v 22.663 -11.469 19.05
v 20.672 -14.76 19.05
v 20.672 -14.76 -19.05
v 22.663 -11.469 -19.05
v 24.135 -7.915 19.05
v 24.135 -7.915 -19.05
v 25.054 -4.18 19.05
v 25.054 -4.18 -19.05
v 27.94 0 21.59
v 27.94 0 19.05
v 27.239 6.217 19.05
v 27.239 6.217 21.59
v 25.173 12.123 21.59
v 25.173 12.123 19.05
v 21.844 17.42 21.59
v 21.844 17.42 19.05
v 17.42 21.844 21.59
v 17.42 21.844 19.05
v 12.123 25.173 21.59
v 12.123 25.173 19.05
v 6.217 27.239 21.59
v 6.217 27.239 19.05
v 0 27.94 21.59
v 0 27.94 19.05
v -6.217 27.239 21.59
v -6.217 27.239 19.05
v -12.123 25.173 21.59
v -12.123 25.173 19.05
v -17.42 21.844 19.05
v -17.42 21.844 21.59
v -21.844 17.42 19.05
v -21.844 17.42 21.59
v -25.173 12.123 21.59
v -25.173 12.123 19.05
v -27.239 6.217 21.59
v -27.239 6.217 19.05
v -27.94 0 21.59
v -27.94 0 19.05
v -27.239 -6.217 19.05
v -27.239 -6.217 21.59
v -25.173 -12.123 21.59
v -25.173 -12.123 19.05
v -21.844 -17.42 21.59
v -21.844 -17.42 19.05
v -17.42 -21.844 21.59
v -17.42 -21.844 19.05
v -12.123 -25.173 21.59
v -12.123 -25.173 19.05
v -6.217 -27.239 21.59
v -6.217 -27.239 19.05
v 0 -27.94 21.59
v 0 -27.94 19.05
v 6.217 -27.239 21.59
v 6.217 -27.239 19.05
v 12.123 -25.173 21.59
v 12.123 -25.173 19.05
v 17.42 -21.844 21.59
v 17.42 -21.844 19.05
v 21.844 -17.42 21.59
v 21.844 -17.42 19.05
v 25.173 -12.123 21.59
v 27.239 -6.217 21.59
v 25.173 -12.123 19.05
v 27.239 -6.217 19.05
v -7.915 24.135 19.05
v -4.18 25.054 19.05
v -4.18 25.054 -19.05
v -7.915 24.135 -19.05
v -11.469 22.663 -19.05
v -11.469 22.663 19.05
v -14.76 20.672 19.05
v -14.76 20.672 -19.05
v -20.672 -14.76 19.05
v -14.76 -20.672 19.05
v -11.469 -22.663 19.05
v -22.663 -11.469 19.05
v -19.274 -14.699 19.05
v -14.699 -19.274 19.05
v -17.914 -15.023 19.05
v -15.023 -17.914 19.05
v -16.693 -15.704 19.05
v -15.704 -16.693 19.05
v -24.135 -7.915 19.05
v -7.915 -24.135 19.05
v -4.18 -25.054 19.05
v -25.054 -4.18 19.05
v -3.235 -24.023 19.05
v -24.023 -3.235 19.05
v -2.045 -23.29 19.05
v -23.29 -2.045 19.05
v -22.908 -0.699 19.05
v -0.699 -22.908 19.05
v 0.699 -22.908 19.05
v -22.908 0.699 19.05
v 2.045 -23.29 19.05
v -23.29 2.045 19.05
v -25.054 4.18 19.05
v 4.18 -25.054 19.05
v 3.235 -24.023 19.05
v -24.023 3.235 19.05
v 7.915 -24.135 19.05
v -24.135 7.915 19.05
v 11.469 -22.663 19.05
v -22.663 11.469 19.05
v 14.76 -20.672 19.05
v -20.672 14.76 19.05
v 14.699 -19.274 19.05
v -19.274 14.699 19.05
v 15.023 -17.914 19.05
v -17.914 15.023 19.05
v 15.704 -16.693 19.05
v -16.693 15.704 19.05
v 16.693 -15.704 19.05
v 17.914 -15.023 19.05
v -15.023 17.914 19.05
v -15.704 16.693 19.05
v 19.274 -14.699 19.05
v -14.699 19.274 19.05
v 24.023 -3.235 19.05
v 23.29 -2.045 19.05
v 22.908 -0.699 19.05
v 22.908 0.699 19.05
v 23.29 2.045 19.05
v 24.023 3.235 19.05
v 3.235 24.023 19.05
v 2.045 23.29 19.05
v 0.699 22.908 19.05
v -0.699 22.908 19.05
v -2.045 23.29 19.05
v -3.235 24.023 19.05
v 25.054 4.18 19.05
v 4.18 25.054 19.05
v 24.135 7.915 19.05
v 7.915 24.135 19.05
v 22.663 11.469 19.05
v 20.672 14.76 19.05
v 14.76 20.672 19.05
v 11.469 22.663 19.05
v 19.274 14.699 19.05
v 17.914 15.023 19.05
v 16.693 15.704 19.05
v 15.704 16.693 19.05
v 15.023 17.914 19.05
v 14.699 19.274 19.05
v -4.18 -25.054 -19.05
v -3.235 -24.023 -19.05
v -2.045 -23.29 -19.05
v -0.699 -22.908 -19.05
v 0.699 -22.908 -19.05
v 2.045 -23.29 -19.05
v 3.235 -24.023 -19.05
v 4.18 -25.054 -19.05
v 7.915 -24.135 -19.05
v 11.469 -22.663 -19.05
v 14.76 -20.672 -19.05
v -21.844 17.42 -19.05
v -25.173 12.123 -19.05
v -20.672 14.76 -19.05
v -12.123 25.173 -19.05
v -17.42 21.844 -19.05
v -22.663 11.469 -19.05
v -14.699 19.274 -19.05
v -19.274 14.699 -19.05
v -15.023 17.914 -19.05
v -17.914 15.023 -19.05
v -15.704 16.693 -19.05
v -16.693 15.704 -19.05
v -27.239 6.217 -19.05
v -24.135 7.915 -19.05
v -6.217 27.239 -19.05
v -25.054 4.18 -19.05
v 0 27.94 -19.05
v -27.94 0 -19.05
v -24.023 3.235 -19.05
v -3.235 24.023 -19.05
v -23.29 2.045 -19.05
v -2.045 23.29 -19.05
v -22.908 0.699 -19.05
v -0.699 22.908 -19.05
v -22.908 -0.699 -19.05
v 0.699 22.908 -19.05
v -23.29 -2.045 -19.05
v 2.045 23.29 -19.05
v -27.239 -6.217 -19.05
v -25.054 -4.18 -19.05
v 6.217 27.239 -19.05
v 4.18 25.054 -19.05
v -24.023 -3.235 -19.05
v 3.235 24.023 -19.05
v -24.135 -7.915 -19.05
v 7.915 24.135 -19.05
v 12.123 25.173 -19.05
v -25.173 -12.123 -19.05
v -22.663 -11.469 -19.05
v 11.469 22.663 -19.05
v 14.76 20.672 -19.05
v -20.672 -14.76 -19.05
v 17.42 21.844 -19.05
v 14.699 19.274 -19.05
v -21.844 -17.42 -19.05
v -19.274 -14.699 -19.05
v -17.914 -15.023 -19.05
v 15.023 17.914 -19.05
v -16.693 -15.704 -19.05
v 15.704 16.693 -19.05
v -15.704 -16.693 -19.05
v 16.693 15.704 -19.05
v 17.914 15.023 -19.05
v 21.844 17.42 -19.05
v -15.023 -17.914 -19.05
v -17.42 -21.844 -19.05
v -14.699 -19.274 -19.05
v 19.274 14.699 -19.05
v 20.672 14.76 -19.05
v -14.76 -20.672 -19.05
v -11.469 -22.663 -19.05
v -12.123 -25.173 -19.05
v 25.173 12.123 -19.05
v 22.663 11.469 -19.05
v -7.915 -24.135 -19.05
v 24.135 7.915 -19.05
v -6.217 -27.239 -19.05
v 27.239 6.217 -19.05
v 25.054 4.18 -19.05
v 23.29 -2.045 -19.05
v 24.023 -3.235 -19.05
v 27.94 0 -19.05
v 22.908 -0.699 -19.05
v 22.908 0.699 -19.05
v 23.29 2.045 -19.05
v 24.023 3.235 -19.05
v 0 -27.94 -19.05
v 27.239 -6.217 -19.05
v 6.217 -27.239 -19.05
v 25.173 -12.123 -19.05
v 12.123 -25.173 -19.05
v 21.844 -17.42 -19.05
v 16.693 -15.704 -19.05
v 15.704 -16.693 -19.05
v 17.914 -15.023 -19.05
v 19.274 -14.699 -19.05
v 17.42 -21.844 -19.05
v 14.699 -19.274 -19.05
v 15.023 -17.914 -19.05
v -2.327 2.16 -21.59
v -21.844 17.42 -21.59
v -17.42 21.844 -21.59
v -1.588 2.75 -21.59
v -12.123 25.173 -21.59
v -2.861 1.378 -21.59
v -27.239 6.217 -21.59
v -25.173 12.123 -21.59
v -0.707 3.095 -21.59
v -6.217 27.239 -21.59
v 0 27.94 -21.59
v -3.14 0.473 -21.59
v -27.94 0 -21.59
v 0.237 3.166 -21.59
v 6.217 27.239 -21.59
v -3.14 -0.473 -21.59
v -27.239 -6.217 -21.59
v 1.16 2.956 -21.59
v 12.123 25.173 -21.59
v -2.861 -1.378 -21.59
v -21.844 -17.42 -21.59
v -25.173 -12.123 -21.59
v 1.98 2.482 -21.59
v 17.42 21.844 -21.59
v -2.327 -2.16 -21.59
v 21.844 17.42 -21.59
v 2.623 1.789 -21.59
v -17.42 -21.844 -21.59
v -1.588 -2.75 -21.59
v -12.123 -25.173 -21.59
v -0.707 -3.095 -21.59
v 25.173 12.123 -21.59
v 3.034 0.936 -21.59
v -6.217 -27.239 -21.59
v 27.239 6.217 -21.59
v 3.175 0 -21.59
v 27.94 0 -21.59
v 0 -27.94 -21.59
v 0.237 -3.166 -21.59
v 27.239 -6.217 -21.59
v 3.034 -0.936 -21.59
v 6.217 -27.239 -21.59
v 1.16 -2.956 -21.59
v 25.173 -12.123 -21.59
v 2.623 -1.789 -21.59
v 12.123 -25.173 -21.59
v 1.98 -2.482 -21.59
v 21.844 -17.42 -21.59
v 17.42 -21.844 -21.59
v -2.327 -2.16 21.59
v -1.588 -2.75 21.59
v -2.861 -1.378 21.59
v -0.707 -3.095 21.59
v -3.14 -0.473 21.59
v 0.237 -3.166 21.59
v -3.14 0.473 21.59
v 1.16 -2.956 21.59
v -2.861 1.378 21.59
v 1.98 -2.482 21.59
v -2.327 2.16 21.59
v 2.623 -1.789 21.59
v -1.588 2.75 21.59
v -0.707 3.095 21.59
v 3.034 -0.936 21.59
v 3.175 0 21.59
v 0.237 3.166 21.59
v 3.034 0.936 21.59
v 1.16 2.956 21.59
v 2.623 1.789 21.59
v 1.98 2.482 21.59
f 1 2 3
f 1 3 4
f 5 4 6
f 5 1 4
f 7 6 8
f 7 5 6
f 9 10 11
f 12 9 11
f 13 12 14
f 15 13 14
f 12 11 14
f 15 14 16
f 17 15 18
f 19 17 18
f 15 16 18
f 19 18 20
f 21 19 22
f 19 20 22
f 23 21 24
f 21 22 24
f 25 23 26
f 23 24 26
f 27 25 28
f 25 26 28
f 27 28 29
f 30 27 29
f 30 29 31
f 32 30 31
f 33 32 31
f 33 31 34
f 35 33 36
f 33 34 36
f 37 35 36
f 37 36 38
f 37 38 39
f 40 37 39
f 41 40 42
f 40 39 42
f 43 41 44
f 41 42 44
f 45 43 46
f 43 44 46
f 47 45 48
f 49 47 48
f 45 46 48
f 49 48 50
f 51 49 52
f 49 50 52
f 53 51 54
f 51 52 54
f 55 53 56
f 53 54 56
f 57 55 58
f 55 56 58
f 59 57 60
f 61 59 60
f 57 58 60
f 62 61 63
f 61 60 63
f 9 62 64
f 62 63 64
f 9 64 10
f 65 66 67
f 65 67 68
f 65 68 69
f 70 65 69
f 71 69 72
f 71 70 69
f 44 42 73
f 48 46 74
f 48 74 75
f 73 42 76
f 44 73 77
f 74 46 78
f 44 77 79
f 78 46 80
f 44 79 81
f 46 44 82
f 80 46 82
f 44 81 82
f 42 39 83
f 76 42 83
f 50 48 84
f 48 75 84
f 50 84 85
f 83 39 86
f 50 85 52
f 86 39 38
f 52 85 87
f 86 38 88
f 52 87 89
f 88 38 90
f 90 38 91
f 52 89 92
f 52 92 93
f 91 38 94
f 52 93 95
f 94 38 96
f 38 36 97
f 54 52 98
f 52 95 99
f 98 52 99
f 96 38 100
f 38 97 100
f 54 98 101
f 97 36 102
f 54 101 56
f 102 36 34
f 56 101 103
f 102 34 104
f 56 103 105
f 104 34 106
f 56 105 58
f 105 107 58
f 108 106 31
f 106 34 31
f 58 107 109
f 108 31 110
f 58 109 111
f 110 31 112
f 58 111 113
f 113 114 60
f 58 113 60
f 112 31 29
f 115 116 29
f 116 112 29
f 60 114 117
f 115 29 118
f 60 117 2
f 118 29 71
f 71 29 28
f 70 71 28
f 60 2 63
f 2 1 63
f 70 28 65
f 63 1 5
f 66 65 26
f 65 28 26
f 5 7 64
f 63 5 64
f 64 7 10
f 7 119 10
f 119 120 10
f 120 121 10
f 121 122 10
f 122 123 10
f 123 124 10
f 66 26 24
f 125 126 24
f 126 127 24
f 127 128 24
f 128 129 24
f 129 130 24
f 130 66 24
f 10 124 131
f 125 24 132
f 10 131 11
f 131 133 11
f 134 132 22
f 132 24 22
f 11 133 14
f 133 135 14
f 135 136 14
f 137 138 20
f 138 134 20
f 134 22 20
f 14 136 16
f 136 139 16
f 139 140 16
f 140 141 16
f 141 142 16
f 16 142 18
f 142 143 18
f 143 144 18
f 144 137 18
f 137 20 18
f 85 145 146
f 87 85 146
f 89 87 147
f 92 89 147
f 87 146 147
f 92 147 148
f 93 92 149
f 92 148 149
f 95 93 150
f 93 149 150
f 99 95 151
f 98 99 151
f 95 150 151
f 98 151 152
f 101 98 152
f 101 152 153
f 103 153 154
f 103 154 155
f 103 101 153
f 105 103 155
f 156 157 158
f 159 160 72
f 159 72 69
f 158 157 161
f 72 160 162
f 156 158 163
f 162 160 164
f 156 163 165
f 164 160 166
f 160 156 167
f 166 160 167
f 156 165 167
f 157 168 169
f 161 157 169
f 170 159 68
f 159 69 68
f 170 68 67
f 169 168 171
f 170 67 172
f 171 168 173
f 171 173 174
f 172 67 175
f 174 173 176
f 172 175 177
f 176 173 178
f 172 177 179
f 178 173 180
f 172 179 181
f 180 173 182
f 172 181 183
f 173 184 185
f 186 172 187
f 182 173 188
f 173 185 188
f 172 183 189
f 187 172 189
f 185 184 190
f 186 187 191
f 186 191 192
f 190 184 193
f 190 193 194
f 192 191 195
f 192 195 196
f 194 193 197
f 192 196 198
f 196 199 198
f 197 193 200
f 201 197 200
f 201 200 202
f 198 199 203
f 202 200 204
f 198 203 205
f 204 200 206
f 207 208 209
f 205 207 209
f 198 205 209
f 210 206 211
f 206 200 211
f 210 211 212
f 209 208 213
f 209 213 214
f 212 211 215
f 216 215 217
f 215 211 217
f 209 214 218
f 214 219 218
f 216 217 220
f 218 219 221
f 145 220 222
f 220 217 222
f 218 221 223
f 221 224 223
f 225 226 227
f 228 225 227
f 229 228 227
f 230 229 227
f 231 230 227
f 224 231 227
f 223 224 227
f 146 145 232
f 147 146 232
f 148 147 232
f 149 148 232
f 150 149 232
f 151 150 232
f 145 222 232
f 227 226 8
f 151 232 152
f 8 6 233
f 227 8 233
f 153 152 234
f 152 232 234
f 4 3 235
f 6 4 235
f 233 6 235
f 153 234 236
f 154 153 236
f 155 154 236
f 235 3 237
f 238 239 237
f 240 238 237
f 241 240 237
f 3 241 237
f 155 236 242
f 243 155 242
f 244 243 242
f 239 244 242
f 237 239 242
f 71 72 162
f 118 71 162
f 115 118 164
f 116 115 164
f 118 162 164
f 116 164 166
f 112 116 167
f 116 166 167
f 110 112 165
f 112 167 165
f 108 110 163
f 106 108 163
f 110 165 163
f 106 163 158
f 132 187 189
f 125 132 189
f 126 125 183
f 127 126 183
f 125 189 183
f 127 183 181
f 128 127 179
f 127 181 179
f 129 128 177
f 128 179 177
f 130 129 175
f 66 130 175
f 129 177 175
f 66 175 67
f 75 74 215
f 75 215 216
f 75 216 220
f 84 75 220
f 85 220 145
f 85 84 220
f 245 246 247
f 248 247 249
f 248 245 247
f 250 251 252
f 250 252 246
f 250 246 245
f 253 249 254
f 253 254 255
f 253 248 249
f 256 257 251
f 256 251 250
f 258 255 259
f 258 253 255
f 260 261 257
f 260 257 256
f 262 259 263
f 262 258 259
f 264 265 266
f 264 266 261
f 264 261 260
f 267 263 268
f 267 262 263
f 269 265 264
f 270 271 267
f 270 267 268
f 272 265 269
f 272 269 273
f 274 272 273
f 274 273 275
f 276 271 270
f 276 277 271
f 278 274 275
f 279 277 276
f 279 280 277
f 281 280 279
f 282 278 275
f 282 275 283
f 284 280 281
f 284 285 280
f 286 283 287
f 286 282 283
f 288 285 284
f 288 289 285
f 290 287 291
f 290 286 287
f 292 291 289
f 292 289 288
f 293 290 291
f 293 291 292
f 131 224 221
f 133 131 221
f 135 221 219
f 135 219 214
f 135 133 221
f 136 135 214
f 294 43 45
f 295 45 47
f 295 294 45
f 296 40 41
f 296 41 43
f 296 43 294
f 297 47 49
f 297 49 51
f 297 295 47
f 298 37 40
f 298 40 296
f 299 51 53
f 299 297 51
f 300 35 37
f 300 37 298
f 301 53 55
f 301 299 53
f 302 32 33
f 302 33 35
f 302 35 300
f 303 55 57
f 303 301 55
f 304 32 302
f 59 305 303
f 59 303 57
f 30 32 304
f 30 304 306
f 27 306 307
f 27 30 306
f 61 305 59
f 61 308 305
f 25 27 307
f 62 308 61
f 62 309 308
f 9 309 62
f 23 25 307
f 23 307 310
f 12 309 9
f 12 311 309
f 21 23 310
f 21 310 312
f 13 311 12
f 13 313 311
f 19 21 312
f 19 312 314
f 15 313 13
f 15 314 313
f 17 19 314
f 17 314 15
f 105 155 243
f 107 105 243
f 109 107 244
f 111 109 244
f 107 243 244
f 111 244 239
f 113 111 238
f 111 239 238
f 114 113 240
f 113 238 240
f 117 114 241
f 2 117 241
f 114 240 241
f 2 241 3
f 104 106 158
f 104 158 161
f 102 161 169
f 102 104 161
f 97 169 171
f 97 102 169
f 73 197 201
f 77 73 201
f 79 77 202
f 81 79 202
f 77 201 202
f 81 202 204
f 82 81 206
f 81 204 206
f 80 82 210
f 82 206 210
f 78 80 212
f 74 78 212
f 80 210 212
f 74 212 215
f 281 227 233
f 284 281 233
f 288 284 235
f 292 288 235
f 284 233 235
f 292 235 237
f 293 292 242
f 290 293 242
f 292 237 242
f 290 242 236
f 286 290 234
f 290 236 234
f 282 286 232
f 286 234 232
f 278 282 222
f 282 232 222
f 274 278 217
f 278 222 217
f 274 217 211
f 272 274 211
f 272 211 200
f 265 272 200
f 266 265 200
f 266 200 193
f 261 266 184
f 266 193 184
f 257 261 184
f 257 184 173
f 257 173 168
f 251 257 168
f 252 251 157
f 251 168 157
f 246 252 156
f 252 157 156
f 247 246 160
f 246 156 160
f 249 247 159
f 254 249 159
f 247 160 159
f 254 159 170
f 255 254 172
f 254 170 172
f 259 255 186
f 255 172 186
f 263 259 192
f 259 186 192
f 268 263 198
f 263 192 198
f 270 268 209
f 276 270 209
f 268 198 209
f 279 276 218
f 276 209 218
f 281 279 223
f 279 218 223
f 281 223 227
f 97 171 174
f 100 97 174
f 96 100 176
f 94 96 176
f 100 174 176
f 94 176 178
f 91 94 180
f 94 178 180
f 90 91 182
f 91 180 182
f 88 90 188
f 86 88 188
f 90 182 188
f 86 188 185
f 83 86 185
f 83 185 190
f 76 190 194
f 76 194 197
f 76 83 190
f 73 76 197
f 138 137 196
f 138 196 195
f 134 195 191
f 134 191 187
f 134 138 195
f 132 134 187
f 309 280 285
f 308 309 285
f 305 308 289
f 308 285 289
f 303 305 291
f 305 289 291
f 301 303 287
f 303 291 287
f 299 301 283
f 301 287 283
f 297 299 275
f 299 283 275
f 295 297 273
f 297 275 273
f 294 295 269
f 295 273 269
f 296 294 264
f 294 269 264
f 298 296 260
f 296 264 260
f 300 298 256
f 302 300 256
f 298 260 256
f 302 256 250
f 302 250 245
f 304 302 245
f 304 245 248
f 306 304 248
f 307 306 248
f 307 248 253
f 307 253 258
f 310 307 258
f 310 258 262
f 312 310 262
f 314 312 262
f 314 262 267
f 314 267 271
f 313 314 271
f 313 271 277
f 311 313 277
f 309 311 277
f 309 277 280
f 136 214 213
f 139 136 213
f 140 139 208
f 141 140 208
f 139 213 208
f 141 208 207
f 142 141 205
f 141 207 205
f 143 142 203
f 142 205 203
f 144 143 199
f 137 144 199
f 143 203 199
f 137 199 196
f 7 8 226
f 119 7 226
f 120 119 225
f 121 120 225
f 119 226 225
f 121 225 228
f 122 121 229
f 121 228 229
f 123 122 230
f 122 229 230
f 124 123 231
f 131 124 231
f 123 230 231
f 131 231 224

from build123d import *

# Parameters (mm, degrees)
F0_R            = 25.4
F1_DEPTH        = 19.05
F2_R            = 27.94
F2_R_2          = 25.4
F3_DEPTH        = 2.54
F5_DEPTH        = 38.1
F5_COPIES_COUNT = 8
F6_R            = 27.94
F7_DEPTH        = 2.54
F8_R            = 3.175
F9_DEPTH        = 43.181


# Not quite as in the source:
# - a pattern or mirror of a feature is missing from the dataset's text; its kind, count and spacing are read off the source's solid


with BuildPart() as f1:
    # F0 (on Top) → F1 (new body, symmetric)
    with BuildSketch(Plane.XY):
        Circle(F0_R)
    extrude(amount=F1_DEPTH, both=True)

    # F2 (on face) → F3 (join)
    with BuildSketch(Plane.XY.offset(19.05)):
        Circle(F2_R)
        Circle(F2_R_2, mode=Mode.SUBTRACT)
        Circle(F2_R_2)
    extrude(amount=F3_DEPTH)

    # F4 (on face) → F5 (cut, through all)
    with BuildSketch(Plane(origin=(0, 0, -19.05), x_dir=(1, 0, 0), z_dir=(0, 0, -1))):
        with BuildLine():
            ThreePointArc((4.1803474687, 25.0536363636), (0, 25.4), (-4.1803474687, 25.0536363636))
            ThreePointArc((-4.1803474687, 25.0536363636), (0, 22.86), (4.1803474687, 25.0536363636))
        make_face()
    f5 = extrude(amount=-F5_DEPTH, mode=Mode.SUBTRACT)

    # F5_copies: F5 ×8 about axis
    f5_copies_axis = Axis((0, 0, 0), (0, 0, 1))
    for i in range(1, F5_COPIES_COUNT):
        add(f5.rotate(f5_copies_axis, i * 360 / F5_COPIES_COUNT), mode=Mode.SUBTRACT)

    # F6 (on face) → F7 (join)
    with BuildSketch(Plane(origin=(0, 0, -19.05), x_dir=(1, 0, 0), z_dir=(0, 0, -1))):
        Circle(F6_R)
    extrude(amount=F7_DEPTH)

    # F8 (on face) → F9 (cut, through all)
    with BuildSketch(Plane(origin=(0, 0, -21.59), x_dir=(1, 0, 0), z_dir=(0, 0, -1))):
        Circle(F8_R)
    extrude(amount=-F9_DEPTH, mode=Mode.SUBTRACT)


solid = f1.part
